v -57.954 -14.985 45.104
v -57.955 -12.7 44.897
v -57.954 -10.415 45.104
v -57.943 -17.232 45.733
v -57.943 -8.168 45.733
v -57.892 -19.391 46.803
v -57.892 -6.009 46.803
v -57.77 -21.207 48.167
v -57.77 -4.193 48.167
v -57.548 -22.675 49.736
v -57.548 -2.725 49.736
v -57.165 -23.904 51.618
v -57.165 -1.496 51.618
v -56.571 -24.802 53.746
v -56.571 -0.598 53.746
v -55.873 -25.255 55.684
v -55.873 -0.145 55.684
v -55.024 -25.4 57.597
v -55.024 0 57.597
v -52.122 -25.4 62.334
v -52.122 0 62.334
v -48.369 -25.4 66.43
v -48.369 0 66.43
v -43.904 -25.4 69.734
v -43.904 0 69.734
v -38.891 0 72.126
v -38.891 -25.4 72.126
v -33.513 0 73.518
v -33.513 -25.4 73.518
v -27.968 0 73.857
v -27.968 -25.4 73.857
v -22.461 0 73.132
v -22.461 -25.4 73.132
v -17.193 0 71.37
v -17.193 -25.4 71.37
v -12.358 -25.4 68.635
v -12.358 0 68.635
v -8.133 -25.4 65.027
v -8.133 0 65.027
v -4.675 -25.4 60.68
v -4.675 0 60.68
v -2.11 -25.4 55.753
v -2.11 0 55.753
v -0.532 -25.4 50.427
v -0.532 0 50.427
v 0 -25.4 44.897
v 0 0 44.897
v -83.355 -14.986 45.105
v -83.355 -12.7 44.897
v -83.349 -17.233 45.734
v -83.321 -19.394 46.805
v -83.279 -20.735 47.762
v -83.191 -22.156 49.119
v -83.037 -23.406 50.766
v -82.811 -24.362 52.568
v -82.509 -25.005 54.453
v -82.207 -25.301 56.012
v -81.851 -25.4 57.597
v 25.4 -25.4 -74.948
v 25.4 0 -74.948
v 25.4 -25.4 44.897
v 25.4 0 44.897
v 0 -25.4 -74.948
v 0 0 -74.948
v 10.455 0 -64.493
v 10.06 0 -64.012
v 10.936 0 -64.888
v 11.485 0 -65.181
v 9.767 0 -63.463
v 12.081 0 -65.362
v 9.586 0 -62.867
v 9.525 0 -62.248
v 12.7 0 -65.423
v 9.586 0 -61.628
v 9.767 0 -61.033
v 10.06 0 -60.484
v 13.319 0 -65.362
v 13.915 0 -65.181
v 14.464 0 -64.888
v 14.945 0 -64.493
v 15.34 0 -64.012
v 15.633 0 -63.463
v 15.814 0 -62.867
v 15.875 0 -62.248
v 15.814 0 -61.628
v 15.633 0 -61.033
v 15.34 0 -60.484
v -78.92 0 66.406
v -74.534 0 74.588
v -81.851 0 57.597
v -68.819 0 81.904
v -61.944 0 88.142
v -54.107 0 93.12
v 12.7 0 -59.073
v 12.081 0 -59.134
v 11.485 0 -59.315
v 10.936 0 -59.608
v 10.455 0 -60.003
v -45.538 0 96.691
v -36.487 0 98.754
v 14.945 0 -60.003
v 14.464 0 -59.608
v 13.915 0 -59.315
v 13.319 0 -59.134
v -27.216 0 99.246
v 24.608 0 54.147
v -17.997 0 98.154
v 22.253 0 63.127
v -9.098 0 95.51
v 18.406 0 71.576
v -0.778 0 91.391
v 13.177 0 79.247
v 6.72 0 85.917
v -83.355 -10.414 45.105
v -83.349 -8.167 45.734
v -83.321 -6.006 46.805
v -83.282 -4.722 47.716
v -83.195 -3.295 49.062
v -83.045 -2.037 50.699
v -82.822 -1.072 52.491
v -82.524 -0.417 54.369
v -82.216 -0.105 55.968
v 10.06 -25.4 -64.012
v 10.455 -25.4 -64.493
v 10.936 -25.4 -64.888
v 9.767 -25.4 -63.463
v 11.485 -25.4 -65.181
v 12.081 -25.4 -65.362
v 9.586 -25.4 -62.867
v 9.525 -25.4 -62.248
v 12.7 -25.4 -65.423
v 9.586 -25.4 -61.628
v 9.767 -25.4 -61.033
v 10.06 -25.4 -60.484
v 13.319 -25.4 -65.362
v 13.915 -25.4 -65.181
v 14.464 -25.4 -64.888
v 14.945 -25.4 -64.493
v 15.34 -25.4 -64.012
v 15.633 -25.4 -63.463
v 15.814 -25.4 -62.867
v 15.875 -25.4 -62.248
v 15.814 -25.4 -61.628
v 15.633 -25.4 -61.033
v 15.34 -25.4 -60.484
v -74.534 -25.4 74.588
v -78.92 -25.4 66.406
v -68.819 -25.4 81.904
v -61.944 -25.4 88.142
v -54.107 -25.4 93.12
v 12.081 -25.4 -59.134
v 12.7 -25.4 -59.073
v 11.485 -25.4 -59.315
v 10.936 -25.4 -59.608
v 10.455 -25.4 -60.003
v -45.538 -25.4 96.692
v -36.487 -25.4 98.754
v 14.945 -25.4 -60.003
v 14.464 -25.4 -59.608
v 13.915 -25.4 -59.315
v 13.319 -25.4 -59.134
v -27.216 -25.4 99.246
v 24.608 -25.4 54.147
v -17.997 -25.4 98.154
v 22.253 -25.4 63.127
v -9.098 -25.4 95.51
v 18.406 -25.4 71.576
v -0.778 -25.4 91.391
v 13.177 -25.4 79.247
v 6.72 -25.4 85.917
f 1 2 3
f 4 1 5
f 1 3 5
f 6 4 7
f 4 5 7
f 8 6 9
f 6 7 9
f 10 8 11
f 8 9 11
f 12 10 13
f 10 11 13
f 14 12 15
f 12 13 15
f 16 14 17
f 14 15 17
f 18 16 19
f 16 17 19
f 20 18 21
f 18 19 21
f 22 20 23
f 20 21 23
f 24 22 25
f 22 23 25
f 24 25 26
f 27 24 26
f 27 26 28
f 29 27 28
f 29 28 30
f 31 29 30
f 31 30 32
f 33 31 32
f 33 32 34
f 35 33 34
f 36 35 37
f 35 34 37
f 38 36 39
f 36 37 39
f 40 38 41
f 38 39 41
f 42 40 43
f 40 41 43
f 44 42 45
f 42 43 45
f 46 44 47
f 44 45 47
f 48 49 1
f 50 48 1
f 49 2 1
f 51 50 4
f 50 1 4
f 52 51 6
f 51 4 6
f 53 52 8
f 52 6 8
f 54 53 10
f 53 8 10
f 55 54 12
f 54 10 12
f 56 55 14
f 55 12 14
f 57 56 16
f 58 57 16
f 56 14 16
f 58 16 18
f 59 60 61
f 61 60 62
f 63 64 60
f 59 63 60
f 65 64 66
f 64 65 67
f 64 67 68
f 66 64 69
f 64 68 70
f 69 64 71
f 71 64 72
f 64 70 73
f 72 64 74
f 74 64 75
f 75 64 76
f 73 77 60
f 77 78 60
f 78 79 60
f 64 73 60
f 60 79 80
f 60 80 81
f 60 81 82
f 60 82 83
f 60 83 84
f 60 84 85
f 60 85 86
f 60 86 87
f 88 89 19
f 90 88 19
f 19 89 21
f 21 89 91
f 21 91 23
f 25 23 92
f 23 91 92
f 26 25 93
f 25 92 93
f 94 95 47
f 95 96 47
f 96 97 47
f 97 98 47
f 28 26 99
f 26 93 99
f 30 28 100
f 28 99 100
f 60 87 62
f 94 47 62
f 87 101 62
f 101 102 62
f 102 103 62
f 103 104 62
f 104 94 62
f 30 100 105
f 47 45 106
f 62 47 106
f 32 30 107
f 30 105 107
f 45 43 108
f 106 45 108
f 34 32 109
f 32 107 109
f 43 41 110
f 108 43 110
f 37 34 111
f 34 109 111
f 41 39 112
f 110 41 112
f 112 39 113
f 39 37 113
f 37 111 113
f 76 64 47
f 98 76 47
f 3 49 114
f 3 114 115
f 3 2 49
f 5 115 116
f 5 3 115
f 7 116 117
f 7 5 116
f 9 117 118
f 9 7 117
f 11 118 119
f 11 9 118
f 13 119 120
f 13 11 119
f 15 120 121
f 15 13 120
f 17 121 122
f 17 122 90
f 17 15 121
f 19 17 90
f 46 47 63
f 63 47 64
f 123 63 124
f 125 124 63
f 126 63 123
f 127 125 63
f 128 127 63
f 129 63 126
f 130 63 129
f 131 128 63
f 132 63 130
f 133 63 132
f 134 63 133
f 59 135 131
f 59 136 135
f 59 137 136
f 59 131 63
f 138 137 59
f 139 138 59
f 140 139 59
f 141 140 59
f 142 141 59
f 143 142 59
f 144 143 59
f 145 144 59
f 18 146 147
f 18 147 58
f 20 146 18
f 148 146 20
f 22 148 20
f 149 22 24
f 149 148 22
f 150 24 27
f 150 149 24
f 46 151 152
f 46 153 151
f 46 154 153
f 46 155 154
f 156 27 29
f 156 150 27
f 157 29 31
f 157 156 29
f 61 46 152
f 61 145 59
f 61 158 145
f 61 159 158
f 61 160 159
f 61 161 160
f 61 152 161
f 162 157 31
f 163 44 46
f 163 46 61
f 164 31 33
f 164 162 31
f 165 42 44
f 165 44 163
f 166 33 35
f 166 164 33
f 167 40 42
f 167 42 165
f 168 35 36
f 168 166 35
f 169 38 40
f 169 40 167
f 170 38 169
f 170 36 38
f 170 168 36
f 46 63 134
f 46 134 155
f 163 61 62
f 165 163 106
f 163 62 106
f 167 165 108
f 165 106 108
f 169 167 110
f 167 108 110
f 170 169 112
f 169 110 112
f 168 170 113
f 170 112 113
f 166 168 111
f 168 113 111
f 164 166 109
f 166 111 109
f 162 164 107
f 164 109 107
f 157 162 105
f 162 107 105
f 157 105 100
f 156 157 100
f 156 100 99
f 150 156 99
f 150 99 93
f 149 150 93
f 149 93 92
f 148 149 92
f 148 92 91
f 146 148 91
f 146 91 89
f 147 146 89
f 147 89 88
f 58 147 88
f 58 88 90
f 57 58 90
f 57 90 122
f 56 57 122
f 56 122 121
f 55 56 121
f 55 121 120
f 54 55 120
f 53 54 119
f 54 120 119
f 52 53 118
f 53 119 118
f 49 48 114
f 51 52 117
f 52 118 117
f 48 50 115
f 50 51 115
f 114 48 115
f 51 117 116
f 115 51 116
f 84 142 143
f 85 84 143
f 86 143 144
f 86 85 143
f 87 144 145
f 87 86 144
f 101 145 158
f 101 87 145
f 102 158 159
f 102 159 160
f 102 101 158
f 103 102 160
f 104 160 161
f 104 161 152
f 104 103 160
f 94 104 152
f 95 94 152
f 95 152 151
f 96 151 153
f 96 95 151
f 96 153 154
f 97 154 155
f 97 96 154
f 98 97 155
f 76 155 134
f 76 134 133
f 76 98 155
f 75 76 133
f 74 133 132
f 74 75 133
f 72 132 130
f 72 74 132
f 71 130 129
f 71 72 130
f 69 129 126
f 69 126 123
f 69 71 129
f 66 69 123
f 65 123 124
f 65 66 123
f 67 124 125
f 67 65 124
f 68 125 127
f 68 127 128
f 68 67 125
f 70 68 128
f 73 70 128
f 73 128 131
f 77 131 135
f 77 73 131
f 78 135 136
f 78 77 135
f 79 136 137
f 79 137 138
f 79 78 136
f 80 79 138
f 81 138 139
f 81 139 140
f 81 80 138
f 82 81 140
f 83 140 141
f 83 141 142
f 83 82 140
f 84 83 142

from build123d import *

# Parameters (mm, degrees)
F0_R     = 3.175
F1_DEPTH = 25.4
F2_R     = 12.7
F3_R     = 12.69999


# Not quite as in the source:
# - a fillet or chamfer is up to 0.001 mm smaller than in the source, because OpenCascade refuses the exact size


with BuildPart() as f1:
    # F0 (on Front) → F1 (new body)
    with BuildSketch(Plane.XZ):
        with BuildLine():
            Line((0, 44.897188701), (0, -74.9478926185))
            Line((0, -74.9478926185), (25.4, -74.9478926185))
            Line((25.4, -74.9478926185), (25.4, 44.897188701))
            ThreePointArc((25.4, 44.897188701), (-28.9774724535, 99.2746611545), (-83.3549449071, 44.897188701))
            Line((-83.3549449071, 44.897188701), (-57.9549449071, 44.897188701))
            ThreePointArc((-57.9549449071, 44.897188701), (-28.9774724535, 73.8746611545), (0, 44.897188701))
        make_face()
        with Locations((12.7, -62.2478926185)):
            Circle(F0_R, mode=Mode.SUBTRACT)
    extrude(amount=F1_DEPTH)

    # F2
    f2_edges = [f1.edges().sort_by_distance(p)[0] for p in [
        (-70.654945, -25.4, 44.897189),
    ]]
    fillet(f2_edges, radius=F2_R)

    # F3 (radius 12.7 in the source; OpenCascade refuses exactly that, so slightly less here)
    f3_edges = [f1.edges().sort_by_distance(p)[0] for p in [
        (-70.654945, 0, 44.897189),
    ]]
    fillet(f3_edges, radius=F3_R)


solid = f1.part
